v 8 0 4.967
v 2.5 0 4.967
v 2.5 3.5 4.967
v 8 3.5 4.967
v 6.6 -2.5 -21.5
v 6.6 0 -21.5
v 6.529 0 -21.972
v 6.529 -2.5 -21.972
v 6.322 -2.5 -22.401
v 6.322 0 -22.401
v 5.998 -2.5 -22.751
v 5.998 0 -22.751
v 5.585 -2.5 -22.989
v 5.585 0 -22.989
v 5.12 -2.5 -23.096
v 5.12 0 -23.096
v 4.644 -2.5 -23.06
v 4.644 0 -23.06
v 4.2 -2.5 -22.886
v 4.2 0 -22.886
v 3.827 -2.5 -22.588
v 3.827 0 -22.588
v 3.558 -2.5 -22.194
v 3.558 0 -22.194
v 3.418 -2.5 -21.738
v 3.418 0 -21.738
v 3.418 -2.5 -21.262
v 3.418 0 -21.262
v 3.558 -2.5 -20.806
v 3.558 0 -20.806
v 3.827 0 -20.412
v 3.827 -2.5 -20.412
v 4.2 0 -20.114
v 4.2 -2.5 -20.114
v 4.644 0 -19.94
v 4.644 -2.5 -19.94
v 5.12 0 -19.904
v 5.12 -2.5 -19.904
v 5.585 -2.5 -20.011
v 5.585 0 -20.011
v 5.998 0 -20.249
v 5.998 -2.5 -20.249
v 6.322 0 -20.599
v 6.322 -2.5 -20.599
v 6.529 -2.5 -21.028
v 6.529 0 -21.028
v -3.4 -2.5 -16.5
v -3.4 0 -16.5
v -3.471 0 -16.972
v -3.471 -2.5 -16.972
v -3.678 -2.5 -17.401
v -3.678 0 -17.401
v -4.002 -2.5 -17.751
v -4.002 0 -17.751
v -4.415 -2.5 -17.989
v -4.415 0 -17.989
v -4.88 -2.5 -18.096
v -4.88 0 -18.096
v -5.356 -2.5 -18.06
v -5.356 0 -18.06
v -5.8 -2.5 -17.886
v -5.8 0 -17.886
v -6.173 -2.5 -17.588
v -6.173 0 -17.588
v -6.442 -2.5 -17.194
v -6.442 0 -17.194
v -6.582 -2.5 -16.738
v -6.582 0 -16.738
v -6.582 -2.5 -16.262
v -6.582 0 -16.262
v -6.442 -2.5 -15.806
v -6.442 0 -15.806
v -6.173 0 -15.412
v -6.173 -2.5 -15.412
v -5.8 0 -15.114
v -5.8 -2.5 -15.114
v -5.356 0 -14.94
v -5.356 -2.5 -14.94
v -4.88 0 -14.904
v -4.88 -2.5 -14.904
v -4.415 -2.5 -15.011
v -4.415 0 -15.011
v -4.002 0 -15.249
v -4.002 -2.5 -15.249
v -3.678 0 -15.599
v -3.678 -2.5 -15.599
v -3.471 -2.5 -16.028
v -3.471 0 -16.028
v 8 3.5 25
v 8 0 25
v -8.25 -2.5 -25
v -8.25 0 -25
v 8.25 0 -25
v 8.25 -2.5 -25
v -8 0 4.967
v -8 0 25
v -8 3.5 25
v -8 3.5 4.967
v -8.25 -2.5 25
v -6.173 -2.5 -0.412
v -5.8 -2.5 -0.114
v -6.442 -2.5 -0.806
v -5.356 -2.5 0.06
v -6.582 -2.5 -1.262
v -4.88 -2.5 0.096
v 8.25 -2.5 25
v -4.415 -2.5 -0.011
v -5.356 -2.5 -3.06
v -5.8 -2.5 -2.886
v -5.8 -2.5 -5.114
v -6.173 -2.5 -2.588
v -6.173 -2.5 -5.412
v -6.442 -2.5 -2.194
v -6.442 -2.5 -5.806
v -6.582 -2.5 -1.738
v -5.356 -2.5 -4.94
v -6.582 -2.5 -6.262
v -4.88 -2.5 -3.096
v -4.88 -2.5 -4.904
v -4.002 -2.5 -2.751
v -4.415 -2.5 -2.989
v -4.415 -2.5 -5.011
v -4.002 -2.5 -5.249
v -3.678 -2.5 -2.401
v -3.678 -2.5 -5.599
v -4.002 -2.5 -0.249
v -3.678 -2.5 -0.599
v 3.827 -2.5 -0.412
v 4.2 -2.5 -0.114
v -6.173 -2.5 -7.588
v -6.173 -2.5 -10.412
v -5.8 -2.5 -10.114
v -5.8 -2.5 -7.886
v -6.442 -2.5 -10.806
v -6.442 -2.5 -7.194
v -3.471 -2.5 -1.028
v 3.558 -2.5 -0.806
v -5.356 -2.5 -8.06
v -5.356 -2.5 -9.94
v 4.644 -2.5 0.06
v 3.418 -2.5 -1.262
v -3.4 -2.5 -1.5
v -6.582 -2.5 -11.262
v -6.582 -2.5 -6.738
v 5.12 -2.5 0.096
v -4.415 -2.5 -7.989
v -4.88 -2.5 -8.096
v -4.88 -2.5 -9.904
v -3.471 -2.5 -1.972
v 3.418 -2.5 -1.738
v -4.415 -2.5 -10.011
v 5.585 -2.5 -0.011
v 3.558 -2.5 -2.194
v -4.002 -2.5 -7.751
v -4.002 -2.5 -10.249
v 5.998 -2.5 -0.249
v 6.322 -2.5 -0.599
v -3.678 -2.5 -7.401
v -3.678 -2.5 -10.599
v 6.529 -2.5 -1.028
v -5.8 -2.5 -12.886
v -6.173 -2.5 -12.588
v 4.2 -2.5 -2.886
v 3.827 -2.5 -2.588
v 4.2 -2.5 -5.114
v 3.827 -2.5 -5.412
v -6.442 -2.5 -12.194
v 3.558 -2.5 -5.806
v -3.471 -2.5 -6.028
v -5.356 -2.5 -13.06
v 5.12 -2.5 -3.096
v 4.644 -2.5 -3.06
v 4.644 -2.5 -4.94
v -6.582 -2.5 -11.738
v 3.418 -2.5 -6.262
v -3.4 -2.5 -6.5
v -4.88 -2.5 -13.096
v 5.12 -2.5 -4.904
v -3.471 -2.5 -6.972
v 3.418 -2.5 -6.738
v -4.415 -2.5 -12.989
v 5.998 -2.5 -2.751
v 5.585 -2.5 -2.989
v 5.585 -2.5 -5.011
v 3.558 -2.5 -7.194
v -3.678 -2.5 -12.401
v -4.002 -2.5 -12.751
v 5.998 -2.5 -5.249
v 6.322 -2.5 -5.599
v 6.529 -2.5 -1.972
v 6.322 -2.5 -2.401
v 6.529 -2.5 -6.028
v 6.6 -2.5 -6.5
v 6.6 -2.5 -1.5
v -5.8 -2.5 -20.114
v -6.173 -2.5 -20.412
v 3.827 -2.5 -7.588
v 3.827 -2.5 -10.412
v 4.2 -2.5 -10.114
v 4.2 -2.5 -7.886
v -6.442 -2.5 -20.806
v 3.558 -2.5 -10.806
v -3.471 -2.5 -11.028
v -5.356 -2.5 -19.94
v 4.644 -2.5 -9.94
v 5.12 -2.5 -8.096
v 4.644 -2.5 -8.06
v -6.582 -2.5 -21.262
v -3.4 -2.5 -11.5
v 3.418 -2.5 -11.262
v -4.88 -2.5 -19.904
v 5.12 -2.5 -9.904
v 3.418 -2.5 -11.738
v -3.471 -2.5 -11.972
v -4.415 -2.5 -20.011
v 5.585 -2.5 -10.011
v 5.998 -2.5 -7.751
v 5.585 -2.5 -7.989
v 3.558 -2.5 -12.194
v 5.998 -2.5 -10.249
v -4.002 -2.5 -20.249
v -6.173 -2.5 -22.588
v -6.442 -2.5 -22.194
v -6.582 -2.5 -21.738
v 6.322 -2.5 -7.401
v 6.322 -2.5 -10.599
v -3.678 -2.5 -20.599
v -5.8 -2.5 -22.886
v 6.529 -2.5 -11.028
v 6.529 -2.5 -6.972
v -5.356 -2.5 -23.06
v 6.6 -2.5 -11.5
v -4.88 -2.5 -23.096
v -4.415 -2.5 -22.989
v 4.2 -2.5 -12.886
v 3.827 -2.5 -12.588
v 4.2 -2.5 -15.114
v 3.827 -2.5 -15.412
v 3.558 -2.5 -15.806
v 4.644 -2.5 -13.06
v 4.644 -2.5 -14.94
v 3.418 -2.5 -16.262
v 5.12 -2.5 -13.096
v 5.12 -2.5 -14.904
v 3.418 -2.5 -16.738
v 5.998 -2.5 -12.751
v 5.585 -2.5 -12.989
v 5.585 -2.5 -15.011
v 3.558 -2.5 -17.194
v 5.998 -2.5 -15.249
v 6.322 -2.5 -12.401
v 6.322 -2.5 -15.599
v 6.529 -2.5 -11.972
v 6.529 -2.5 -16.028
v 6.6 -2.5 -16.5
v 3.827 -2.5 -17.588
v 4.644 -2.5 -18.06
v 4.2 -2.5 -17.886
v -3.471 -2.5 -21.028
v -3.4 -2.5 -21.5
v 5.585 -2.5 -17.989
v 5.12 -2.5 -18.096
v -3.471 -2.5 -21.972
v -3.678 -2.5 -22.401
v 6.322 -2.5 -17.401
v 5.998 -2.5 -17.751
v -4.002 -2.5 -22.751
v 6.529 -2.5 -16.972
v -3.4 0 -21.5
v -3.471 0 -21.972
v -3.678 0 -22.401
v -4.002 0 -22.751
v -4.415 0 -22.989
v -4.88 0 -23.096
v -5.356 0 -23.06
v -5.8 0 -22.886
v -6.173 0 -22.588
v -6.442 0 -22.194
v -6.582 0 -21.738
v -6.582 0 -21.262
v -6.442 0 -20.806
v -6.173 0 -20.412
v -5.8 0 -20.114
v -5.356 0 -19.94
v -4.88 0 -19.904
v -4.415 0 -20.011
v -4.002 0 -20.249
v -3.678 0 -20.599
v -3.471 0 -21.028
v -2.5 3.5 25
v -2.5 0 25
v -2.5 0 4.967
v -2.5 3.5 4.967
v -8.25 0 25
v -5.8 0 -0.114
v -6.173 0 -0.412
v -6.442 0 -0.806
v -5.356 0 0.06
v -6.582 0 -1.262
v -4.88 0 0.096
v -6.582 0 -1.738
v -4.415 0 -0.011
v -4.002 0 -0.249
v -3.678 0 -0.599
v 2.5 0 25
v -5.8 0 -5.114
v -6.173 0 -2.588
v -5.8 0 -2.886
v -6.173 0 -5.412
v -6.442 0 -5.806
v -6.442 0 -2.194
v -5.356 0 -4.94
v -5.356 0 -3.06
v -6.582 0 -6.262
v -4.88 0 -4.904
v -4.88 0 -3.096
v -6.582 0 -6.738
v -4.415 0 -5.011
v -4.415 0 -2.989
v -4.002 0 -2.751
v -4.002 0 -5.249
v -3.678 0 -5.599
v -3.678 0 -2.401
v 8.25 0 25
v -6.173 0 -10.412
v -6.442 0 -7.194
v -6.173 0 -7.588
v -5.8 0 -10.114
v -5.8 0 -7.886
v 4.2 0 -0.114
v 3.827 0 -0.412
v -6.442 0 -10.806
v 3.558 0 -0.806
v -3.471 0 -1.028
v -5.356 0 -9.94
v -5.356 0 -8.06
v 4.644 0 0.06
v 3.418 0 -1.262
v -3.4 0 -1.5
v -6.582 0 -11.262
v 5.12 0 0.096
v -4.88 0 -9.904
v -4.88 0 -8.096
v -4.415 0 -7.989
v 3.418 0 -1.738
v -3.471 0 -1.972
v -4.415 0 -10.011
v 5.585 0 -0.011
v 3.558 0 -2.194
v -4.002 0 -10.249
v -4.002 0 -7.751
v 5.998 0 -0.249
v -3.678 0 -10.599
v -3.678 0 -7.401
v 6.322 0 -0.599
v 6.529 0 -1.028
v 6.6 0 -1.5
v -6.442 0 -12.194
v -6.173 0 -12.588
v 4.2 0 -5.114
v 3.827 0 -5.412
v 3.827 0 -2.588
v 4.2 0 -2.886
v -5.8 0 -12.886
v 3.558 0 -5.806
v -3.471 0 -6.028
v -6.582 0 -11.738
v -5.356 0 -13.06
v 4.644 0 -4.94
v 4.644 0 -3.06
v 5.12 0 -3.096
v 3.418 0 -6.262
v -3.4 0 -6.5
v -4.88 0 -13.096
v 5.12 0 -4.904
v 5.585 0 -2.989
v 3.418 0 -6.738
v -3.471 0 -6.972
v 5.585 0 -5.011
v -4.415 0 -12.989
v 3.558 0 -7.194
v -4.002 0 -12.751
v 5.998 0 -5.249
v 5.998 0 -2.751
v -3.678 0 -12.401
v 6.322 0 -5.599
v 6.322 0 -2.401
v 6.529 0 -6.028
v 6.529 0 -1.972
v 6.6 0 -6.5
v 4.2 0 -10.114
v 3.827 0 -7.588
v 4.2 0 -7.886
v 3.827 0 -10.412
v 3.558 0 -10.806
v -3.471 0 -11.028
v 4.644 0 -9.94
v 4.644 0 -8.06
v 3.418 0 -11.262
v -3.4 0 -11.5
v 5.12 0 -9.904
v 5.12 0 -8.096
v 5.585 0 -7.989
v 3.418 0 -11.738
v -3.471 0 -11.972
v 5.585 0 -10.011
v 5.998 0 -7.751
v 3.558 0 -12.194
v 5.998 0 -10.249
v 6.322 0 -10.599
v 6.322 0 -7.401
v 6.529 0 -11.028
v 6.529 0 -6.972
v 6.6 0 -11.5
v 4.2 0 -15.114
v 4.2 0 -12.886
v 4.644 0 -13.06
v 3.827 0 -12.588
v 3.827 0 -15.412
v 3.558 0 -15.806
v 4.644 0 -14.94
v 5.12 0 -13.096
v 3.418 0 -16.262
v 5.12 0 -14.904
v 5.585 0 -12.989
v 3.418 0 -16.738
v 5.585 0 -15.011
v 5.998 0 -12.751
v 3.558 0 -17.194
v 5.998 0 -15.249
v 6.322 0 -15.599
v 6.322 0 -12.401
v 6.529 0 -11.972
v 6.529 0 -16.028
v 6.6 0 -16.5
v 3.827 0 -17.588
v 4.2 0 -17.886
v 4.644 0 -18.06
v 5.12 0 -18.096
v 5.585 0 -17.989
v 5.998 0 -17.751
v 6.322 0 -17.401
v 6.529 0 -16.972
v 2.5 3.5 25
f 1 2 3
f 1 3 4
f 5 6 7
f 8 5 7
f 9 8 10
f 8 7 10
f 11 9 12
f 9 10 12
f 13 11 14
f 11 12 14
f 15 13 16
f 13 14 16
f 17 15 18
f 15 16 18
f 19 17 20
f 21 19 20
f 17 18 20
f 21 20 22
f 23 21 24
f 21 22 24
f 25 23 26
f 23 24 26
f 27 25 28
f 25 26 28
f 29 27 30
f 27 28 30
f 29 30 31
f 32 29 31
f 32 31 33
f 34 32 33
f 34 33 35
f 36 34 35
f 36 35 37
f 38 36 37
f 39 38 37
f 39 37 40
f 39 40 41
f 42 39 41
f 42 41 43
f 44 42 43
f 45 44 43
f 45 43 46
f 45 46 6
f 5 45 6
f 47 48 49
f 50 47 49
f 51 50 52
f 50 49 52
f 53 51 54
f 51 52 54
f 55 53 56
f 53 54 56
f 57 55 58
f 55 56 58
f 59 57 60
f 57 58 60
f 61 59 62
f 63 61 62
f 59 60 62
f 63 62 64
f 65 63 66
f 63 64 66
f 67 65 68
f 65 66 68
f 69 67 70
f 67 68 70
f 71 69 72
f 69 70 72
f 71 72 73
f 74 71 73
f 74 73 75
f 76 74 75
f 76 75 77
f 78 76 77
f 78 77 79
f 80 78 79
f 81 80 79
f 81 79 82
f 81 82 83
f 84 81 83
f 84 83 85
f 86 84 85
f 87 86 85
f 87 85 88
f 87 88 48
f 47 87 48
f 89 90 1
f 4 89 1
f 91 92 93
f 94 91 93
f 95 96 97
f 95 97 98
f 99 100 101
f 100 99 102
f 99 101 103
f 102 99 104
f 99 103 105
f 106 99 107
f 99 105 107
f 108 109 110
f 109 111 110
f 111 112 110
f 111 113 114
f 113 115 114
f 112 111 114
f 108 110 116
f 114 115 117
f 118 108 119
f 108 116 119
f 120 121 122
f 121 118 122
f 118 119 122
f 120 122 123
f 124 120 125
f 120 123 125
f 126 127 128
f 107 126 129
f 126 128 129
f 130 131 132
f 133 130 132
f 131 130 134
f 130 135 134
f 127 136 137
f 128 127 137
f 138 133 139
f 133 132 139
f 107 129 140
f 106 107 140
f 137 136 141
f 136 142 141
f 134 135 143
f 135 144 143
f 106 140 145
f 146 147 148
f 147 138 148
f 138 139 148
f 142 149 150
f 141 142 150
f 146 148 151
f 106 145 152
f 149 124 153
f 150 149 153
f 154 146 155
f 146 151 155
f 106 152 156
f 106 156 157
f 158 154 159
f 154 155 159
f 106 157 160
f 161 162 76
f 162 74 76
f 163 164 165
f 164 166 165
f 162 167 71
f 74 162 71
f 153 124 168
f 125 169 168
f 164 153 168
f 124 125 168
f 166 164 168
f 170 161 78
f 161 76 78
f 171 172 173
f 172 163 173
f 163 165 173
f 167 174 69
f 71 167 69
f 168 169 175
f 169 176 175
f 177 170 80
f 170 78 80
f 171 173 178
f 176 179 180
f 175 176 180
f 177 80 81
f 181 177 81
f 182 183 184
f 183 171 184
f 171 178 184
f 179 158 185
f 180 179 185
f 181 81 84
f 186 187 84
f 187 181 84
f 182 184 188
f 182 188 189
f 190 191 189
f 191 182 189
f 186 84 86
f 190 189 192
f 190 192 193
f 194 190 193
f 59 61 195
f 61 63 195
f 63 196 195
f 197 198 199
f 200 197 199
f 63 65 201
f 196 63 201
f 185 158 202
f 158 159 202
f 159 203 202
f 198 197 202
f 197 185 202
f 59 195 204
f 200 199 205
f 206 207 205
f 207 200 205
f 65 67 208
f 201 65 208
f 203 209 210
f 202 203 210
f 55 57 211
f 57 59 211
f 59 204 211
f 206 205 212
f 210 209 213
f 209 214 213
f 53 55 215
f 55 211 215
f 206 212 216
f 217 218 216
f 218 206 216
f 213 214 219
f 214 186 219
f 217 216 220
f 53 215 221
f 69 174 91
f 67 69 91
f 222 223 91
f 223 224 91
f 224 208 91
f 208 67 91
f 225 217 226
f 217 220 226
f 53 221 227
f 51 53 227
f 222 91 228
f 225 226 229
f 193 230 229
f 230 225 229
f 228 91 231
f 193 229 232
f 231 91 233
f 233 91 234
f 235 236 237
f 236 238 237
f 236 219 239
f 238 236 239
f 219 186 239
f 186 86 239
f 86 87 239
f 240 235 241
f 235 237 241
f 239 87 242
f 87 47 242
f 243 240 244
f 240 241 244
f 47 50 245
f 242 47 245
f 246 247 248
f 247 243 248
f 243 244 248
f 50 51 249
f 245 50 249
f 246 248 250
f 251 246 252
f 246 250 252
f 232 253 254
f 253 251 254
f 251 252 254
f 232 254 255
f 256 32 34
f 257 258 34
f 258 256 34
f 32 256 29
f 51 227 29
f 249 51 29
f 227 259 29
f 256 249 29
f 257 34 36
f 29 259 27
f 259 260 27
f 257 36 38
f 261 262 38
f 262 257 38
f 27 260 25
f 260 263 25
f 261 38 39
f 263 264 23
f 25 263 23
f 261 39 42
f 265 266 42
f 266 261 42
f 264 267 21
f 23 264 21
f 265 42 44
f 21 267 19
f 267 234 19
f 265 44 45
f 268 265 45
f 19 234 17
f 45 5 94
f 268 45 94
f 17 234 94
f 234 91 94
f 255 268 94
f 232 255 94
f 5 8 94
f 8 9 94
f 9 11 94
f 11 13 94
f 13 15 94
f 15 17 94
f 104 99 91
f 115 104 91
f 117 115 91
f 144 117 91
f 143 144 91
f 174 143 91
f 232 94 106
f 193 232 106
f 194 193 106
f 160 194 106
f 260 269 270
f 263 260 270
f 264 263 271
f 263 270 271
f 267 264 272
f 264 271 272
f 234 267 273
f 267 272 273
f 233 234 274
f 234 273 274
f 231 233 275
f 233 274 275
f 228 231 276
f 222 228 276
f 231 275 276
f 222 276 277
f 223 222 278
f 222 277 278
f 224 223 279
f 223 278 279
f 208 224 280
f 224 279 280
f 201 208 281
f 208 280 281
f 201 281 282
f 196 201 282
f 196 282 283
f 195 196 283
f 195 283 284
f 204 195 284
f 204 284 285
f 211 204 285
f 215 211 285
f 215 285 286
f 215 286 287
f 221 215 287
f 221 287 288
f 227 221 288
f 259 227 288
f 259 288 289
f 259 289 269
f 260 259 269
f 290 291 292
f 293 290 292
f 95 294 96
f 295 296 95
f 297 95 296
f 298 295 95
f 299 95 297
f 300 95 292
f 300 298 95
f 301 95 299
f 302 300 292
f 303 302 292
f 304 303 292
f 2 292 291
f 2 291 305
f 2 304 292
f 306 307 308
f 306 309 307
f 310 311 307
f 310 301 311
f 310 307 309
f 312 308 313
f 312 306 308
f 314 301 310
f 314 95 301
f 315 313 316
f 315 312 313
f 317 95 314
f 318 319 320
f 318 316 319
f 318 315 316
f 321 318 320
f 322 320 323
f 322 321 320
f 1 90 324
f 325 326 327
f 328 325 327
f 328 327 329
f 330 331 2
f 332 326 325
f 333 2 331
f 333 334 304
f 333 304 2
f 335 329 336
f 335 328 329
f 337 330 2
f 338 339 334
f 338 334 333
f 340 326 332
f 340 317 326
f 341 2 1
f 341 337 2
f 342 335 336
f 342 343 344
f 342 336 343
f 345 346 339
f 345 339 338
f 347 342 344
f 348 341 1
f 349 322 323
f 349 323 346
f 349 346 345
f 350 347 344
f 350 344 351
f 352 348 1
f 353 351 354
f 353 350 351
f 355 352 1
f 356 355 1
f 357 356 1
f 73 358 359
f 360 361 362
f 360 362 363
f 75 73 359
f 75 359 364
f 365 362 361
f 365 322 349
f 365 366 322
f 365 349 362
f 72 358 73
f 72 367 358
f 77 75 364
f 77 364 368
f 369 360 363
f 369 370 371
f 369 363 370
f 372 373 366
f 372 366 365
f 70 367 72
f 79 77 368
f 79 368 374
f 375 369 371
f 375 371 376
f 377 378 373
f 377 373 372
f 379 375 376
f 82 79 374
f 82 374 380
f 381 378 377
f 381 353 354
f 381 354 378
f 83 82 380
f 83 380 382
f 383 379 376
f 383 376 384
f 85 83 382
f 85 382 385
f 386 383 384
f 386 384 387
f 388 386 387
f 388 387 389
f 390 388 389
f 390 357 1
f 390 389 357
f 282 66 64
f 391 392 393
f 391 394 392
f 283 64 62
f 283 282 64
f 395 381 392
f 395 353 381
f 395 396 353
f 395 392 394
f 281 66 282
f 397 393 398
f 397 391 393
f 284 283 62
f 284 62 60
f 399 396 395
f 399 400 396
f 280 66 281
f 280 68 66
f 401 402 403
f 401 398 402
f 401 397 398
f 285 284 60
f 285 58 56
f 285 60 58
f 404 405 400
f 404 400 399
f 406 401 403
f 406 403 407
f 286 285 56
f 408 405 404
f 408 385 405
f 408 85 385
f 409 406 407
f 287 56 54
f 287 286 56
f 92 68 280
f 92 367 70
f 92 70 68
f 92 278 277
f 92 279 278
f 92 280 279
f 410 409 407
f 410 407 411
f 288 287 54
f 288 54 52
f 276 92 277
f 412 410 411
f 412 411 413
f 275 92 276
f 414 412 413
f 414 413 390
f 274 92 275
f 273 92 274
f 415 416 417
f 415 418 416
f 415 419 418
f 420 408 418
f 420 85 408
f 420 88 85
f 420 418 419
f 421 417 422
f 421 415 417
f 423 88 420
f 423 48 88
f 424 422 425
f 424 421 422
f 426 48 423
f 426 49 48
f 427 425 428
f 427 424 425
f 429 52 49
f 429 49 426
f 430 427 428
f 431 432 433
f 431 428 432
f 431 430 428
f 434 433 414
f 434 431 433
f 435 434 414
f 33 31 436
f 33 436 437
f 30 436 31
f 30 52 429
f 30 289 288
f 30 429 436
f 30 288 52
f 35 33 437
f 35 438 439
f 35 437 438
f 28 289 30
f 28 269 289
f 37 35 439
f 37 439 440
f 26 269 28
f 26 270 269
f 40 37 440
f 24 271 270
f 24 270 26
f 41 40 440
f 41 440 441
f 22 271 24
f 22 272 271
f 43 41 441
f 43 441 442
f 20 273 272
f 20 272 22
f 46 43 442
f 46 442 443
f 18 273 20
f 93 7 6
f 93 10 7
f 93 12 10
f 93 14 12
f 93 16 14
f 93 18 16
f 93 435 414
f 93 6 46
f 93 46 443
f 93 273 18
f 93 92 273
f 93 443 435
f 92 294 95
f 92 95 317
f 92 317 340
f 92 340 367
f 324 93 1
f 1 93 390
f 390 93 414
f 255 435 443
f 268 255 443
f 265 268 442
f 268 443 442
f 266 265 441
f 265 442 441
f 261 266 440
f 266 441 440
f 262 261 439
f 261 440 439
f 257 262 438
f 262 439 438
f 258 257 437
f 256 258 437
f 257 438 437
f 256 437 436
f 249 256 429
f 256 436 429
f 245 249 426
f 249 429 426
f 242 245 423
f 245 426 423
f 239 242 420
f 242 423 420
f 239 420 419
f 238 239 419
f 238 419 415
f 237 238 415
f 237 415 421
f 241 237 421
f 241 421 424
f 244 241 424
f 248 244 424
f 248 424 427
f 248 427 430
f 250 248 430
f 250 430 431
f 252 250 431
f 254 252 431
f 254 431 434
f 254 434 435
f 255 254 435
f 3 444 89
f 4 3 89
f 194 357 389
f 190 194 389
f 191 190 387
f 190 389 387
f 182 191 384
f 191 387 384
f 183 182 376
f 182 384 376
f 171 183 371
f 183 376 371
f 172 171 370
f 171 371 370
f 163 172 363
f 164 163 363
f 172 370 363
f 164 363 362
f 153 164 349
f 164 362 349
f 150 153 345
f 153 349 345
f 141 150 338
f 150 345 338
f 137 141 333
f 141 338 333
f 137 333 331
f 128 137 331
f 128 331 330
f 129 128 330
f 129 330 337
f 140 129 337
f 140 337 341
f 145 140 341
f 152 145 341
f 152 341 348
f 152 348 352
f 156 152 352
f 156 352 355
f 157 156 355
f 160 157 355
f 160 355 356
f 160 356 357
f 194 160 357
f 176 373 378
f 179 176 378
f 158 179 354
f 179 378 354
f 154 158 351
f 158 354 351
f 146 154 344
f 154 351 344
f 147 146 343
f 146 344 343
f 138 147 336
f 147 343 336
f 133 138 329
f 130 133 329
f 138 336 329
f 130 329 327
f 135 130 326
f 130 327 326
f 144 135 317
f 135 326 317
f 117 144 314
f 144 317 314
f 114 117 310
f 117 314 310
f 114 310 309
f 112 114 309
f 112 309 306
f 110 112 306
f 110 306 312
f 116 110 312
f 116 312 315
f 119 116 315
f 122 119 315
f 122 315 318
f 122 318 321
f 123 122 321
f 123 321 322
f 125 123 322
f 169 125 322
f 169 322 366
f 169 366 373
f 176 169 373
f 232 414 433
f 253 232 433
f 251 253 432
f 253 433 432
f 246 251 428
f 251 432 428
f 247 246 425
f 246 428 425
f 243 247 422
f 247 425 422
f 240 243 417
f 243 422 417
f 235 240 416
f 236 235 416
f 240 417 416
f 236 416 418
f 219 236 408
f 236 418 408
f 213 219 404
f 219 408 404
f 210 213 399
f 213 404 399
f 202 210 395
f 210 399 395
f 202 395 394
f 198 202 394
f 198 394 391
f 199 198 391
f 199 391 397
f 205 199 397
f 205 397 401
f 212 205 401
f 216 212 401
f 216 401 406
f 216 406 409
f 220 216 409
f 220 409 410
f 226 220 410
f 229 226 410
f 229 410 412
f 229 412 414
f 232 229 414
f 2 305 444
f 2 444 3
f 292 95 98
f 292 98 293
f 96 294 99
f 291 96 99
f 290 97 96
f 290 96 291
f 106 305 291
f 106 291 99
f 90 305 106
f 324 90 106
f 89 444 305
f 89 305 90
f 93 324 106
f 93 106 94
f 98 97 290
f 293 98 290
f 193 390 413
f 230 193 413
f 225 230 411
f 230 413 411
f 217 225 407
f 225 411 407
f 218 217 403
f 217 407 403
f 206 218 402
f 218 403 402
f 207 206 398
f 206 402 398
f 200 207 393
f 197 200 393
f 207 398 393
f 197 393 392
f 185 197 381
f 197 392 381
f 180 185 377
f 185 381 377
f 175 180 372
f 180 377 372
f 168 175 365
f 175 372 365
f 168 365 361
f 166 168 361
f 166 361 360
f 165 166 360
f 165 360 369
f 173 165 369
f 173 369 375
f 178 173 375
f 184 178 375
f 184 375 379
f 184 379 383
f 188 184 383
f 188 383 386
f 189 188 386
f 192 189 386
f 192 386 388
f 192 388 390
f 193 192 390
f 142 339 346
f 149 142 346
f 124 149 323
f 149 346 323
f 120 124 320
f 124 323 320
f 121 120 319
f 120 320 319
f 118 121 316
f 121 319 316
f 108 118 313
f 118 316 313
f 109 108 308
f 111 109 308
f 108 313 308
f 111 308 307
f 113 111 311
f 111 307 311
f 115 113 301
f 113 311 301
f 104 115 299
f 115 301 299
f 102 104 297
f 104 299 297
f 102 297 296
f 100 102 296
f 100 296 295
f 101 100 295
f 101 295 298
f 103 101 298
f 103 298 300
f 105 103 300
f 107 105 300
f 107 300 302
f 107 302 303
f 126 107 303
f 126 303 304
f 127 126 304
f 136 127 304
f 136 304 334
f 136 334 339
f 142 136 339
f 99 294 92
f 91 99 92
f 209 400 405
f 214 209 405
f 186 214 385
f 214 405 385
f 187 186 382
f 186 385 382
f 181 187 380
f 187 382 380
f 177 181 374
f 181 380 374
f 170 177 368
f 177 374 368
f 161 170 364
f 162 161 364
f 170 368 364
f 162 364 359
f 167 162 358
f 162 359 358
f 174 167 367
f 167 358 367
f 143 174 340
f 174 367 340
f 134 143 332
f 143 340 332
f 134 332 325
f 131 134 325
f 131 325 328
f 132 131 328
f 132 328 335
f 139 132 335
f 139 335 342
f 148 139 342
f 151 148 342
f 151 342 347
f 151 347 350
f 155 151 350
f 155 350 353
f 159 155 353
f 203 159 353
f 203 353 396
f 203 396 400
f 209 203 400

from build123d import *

# Parameters (mm, degrees)
SKETCH1_W           = 16.5
SKETCH1_H           = 50
BOSS_EXTRUDE1_DEPTH = 2.5
SKETCH2_W           = 5.5
SKETCH2_H           = 20.032642475
BOSS_EXTRUDE2_DEPTH = 3.5
SKETCH4_R           = 1.6
CUT_EXTRUDE1_DEPTH  = 3.5
LPATTERN1_COUNT     = 5
LPATTERN1_PITCH     = 5


with BuildPart() as part:
    # Sketch1 → Boss-Extrude1 (new body)
    with BuildSketch(Plane(origin=(0, 0, 0), x_dir=(1, 0, 0), z_dir=(0, 1, 0))):
        Rectangle(SKETCH1_W, SKETCH1_H)
    extrude(amount=-BOSS_EXTRUDE1_DEPTH)

    # Sketch2 → Boss-Extrude2 (add)
    with BuildSketch(Plane(origin=(0, 0, 0), x_dir=(1, 0, 0), z_dir=(0, 1, 0))):
        with Locations((-5.25, -14.983678763)):
            Rectangle(SKETCH2_W, SKETCH2_H)
        with Locations((5.25, -14.983678763)):
            Rectangle(SKETCH2_W, SKETCH2_H)
    extrude(amount=BOSS_EXTRUDE2_DEPTH)

    # Sketch4 → Cut-Extrude1 (cut, through all)
    with BuildSketch(Plane(origin=(0, 0, 0), x_dir=(1, 0, 0), z_dir=(0, 1, 0))):
        with Locations((-5, 21.5)):
            Circle(SKETCH4_R)
        with Locations((5, 21.5)):
            Circle(SKETCH4_R)
    cut_extrude1 = extrude(amount=-CUT_EXTRUDE1_DEPTH, mode=Mode.SUBTRACT)

    # LPattern1: Cut-Extrude1 ×5
    with Locations(*[(0, 0, i * LPATTERN1_PITCH) for i in range(1, LPATTERN1_COUNT)]):
        add(cut_extrude1, mode=Mode.SUBTRACT)


solid = part.part
